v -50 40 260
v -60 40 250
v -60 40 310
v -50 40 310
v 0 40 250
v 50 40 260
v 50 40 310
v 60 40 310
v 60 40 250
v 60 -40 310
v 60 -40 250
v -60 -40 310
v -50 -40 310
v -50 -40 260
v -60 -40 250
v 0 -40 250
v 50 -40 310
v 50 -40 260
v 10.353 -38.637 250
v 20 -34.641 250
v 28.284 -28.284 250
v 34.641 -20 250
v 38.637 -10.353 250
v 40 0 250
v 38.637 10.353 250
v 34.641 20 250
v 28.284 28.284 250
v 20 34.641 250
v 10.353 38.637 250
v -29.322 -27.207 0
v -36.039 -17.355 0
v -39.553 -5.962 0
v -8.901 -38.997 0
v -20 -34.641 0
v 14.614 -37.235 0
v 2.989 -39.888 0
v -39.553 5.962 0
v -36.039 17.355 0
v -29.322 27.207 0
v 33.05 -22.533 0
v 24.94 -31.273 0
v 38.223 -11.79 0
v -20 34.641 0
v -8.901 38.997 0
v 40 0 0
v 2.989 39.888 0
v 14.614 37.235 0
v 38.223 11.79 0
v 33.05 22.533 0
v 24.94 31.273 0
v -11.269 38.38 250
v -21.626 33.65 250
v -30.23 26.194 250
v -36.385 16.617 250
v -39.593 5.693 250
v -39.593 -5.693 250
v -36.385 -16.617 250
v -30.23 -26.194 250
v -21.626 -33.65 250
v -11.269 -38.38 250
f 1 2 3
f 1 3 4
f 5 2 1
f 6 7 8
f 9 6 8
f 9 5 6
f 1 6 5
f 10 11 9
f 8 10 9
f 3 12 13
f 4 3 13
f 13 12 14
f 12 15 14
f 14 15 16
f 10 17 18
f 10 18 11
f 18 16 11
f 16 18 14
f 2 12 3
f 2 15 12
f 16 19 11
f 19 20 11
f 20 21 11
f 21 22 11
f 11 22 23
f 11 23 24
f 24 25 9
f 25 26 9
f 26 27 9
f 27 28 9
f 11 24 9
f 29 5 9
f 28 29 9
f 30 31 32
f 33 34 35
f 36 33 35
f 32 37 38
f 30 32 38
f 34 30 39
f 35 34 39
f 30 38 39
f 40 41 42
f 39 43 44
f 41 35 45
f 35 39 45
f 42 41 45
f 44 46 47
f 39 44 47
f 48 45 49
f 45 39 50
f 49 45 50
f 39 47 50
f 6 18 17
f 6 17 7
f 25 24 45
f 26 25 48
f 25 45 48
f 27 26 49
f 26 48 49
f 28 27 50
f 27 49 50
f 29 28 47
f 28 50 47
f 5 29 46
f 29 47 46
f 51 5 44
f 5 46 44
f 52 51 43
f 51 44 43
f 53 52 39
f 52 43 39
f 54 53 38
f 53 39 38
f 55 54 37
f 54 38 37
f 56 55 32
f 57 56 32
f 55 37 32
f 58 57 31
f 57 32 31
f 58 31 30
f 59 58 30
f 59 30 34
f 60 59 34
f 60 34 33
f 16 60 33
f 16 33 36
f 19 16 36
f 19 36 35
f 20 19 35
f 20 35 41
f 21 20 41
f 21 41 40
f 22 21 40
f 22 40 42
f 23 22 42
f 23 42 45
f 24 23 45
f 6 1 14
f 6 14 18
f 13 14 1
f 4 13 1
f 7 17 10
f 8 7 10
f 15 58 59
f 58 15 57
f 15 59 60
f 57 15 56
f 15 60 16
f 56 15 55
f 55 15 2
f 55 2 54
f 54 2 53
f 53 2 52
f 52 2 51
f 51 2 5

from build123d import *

# Parameters (mm, degrees)
SZKIC1_R                    = 40
DODANIE_WYCI_GNI_CIE1_DEPTH = 250
SZKIC2_W                    = 120
SZKIC2_H                    = 80
DODANIE_WYCI_GNI_CIE2_DEPTH = 10
SZKIC3_W                    = 10
SZKIC3_H                    = 80
DODANIE_WYCI_GNI_CIE3_DEPTH = 50


with BuildPart() as part:
    # Szkic1 → Dodanie-wyciągnięcie1 (new body)
    with BuildSketch(Plane.XY):
        Circle(SZKIC1_R)
    extrude(amount=DODANIE_WYCI_GNI_CIE1_DEPTH)

    # Szkic2 → Dodanie-wyciągnięcie2 (add)
    with BuildSketch(Plane.XY.offset(250)):
        Rectangle(SZKIC2_W, SZKIC2_H)
    extrude(amount=DODANIE_WYCI_GNI_CIE2_DEPTH)

    # Szkic3 → Dodanie-wyciągnięcie3 (add)
    with BuildSketch(Plane.XY.offset(260)):
        with Locations((-55, 0)):
            Rectangle(SZKIC3_W, SZKIC3_H)
        with Locations((55, 0)):
            Rectangle(SZKIC3_W, SZKIC3_H)
    extrude(amount=DODANIE_WYCI_GNI_CIE3_DEPTH)


solid = part.part
